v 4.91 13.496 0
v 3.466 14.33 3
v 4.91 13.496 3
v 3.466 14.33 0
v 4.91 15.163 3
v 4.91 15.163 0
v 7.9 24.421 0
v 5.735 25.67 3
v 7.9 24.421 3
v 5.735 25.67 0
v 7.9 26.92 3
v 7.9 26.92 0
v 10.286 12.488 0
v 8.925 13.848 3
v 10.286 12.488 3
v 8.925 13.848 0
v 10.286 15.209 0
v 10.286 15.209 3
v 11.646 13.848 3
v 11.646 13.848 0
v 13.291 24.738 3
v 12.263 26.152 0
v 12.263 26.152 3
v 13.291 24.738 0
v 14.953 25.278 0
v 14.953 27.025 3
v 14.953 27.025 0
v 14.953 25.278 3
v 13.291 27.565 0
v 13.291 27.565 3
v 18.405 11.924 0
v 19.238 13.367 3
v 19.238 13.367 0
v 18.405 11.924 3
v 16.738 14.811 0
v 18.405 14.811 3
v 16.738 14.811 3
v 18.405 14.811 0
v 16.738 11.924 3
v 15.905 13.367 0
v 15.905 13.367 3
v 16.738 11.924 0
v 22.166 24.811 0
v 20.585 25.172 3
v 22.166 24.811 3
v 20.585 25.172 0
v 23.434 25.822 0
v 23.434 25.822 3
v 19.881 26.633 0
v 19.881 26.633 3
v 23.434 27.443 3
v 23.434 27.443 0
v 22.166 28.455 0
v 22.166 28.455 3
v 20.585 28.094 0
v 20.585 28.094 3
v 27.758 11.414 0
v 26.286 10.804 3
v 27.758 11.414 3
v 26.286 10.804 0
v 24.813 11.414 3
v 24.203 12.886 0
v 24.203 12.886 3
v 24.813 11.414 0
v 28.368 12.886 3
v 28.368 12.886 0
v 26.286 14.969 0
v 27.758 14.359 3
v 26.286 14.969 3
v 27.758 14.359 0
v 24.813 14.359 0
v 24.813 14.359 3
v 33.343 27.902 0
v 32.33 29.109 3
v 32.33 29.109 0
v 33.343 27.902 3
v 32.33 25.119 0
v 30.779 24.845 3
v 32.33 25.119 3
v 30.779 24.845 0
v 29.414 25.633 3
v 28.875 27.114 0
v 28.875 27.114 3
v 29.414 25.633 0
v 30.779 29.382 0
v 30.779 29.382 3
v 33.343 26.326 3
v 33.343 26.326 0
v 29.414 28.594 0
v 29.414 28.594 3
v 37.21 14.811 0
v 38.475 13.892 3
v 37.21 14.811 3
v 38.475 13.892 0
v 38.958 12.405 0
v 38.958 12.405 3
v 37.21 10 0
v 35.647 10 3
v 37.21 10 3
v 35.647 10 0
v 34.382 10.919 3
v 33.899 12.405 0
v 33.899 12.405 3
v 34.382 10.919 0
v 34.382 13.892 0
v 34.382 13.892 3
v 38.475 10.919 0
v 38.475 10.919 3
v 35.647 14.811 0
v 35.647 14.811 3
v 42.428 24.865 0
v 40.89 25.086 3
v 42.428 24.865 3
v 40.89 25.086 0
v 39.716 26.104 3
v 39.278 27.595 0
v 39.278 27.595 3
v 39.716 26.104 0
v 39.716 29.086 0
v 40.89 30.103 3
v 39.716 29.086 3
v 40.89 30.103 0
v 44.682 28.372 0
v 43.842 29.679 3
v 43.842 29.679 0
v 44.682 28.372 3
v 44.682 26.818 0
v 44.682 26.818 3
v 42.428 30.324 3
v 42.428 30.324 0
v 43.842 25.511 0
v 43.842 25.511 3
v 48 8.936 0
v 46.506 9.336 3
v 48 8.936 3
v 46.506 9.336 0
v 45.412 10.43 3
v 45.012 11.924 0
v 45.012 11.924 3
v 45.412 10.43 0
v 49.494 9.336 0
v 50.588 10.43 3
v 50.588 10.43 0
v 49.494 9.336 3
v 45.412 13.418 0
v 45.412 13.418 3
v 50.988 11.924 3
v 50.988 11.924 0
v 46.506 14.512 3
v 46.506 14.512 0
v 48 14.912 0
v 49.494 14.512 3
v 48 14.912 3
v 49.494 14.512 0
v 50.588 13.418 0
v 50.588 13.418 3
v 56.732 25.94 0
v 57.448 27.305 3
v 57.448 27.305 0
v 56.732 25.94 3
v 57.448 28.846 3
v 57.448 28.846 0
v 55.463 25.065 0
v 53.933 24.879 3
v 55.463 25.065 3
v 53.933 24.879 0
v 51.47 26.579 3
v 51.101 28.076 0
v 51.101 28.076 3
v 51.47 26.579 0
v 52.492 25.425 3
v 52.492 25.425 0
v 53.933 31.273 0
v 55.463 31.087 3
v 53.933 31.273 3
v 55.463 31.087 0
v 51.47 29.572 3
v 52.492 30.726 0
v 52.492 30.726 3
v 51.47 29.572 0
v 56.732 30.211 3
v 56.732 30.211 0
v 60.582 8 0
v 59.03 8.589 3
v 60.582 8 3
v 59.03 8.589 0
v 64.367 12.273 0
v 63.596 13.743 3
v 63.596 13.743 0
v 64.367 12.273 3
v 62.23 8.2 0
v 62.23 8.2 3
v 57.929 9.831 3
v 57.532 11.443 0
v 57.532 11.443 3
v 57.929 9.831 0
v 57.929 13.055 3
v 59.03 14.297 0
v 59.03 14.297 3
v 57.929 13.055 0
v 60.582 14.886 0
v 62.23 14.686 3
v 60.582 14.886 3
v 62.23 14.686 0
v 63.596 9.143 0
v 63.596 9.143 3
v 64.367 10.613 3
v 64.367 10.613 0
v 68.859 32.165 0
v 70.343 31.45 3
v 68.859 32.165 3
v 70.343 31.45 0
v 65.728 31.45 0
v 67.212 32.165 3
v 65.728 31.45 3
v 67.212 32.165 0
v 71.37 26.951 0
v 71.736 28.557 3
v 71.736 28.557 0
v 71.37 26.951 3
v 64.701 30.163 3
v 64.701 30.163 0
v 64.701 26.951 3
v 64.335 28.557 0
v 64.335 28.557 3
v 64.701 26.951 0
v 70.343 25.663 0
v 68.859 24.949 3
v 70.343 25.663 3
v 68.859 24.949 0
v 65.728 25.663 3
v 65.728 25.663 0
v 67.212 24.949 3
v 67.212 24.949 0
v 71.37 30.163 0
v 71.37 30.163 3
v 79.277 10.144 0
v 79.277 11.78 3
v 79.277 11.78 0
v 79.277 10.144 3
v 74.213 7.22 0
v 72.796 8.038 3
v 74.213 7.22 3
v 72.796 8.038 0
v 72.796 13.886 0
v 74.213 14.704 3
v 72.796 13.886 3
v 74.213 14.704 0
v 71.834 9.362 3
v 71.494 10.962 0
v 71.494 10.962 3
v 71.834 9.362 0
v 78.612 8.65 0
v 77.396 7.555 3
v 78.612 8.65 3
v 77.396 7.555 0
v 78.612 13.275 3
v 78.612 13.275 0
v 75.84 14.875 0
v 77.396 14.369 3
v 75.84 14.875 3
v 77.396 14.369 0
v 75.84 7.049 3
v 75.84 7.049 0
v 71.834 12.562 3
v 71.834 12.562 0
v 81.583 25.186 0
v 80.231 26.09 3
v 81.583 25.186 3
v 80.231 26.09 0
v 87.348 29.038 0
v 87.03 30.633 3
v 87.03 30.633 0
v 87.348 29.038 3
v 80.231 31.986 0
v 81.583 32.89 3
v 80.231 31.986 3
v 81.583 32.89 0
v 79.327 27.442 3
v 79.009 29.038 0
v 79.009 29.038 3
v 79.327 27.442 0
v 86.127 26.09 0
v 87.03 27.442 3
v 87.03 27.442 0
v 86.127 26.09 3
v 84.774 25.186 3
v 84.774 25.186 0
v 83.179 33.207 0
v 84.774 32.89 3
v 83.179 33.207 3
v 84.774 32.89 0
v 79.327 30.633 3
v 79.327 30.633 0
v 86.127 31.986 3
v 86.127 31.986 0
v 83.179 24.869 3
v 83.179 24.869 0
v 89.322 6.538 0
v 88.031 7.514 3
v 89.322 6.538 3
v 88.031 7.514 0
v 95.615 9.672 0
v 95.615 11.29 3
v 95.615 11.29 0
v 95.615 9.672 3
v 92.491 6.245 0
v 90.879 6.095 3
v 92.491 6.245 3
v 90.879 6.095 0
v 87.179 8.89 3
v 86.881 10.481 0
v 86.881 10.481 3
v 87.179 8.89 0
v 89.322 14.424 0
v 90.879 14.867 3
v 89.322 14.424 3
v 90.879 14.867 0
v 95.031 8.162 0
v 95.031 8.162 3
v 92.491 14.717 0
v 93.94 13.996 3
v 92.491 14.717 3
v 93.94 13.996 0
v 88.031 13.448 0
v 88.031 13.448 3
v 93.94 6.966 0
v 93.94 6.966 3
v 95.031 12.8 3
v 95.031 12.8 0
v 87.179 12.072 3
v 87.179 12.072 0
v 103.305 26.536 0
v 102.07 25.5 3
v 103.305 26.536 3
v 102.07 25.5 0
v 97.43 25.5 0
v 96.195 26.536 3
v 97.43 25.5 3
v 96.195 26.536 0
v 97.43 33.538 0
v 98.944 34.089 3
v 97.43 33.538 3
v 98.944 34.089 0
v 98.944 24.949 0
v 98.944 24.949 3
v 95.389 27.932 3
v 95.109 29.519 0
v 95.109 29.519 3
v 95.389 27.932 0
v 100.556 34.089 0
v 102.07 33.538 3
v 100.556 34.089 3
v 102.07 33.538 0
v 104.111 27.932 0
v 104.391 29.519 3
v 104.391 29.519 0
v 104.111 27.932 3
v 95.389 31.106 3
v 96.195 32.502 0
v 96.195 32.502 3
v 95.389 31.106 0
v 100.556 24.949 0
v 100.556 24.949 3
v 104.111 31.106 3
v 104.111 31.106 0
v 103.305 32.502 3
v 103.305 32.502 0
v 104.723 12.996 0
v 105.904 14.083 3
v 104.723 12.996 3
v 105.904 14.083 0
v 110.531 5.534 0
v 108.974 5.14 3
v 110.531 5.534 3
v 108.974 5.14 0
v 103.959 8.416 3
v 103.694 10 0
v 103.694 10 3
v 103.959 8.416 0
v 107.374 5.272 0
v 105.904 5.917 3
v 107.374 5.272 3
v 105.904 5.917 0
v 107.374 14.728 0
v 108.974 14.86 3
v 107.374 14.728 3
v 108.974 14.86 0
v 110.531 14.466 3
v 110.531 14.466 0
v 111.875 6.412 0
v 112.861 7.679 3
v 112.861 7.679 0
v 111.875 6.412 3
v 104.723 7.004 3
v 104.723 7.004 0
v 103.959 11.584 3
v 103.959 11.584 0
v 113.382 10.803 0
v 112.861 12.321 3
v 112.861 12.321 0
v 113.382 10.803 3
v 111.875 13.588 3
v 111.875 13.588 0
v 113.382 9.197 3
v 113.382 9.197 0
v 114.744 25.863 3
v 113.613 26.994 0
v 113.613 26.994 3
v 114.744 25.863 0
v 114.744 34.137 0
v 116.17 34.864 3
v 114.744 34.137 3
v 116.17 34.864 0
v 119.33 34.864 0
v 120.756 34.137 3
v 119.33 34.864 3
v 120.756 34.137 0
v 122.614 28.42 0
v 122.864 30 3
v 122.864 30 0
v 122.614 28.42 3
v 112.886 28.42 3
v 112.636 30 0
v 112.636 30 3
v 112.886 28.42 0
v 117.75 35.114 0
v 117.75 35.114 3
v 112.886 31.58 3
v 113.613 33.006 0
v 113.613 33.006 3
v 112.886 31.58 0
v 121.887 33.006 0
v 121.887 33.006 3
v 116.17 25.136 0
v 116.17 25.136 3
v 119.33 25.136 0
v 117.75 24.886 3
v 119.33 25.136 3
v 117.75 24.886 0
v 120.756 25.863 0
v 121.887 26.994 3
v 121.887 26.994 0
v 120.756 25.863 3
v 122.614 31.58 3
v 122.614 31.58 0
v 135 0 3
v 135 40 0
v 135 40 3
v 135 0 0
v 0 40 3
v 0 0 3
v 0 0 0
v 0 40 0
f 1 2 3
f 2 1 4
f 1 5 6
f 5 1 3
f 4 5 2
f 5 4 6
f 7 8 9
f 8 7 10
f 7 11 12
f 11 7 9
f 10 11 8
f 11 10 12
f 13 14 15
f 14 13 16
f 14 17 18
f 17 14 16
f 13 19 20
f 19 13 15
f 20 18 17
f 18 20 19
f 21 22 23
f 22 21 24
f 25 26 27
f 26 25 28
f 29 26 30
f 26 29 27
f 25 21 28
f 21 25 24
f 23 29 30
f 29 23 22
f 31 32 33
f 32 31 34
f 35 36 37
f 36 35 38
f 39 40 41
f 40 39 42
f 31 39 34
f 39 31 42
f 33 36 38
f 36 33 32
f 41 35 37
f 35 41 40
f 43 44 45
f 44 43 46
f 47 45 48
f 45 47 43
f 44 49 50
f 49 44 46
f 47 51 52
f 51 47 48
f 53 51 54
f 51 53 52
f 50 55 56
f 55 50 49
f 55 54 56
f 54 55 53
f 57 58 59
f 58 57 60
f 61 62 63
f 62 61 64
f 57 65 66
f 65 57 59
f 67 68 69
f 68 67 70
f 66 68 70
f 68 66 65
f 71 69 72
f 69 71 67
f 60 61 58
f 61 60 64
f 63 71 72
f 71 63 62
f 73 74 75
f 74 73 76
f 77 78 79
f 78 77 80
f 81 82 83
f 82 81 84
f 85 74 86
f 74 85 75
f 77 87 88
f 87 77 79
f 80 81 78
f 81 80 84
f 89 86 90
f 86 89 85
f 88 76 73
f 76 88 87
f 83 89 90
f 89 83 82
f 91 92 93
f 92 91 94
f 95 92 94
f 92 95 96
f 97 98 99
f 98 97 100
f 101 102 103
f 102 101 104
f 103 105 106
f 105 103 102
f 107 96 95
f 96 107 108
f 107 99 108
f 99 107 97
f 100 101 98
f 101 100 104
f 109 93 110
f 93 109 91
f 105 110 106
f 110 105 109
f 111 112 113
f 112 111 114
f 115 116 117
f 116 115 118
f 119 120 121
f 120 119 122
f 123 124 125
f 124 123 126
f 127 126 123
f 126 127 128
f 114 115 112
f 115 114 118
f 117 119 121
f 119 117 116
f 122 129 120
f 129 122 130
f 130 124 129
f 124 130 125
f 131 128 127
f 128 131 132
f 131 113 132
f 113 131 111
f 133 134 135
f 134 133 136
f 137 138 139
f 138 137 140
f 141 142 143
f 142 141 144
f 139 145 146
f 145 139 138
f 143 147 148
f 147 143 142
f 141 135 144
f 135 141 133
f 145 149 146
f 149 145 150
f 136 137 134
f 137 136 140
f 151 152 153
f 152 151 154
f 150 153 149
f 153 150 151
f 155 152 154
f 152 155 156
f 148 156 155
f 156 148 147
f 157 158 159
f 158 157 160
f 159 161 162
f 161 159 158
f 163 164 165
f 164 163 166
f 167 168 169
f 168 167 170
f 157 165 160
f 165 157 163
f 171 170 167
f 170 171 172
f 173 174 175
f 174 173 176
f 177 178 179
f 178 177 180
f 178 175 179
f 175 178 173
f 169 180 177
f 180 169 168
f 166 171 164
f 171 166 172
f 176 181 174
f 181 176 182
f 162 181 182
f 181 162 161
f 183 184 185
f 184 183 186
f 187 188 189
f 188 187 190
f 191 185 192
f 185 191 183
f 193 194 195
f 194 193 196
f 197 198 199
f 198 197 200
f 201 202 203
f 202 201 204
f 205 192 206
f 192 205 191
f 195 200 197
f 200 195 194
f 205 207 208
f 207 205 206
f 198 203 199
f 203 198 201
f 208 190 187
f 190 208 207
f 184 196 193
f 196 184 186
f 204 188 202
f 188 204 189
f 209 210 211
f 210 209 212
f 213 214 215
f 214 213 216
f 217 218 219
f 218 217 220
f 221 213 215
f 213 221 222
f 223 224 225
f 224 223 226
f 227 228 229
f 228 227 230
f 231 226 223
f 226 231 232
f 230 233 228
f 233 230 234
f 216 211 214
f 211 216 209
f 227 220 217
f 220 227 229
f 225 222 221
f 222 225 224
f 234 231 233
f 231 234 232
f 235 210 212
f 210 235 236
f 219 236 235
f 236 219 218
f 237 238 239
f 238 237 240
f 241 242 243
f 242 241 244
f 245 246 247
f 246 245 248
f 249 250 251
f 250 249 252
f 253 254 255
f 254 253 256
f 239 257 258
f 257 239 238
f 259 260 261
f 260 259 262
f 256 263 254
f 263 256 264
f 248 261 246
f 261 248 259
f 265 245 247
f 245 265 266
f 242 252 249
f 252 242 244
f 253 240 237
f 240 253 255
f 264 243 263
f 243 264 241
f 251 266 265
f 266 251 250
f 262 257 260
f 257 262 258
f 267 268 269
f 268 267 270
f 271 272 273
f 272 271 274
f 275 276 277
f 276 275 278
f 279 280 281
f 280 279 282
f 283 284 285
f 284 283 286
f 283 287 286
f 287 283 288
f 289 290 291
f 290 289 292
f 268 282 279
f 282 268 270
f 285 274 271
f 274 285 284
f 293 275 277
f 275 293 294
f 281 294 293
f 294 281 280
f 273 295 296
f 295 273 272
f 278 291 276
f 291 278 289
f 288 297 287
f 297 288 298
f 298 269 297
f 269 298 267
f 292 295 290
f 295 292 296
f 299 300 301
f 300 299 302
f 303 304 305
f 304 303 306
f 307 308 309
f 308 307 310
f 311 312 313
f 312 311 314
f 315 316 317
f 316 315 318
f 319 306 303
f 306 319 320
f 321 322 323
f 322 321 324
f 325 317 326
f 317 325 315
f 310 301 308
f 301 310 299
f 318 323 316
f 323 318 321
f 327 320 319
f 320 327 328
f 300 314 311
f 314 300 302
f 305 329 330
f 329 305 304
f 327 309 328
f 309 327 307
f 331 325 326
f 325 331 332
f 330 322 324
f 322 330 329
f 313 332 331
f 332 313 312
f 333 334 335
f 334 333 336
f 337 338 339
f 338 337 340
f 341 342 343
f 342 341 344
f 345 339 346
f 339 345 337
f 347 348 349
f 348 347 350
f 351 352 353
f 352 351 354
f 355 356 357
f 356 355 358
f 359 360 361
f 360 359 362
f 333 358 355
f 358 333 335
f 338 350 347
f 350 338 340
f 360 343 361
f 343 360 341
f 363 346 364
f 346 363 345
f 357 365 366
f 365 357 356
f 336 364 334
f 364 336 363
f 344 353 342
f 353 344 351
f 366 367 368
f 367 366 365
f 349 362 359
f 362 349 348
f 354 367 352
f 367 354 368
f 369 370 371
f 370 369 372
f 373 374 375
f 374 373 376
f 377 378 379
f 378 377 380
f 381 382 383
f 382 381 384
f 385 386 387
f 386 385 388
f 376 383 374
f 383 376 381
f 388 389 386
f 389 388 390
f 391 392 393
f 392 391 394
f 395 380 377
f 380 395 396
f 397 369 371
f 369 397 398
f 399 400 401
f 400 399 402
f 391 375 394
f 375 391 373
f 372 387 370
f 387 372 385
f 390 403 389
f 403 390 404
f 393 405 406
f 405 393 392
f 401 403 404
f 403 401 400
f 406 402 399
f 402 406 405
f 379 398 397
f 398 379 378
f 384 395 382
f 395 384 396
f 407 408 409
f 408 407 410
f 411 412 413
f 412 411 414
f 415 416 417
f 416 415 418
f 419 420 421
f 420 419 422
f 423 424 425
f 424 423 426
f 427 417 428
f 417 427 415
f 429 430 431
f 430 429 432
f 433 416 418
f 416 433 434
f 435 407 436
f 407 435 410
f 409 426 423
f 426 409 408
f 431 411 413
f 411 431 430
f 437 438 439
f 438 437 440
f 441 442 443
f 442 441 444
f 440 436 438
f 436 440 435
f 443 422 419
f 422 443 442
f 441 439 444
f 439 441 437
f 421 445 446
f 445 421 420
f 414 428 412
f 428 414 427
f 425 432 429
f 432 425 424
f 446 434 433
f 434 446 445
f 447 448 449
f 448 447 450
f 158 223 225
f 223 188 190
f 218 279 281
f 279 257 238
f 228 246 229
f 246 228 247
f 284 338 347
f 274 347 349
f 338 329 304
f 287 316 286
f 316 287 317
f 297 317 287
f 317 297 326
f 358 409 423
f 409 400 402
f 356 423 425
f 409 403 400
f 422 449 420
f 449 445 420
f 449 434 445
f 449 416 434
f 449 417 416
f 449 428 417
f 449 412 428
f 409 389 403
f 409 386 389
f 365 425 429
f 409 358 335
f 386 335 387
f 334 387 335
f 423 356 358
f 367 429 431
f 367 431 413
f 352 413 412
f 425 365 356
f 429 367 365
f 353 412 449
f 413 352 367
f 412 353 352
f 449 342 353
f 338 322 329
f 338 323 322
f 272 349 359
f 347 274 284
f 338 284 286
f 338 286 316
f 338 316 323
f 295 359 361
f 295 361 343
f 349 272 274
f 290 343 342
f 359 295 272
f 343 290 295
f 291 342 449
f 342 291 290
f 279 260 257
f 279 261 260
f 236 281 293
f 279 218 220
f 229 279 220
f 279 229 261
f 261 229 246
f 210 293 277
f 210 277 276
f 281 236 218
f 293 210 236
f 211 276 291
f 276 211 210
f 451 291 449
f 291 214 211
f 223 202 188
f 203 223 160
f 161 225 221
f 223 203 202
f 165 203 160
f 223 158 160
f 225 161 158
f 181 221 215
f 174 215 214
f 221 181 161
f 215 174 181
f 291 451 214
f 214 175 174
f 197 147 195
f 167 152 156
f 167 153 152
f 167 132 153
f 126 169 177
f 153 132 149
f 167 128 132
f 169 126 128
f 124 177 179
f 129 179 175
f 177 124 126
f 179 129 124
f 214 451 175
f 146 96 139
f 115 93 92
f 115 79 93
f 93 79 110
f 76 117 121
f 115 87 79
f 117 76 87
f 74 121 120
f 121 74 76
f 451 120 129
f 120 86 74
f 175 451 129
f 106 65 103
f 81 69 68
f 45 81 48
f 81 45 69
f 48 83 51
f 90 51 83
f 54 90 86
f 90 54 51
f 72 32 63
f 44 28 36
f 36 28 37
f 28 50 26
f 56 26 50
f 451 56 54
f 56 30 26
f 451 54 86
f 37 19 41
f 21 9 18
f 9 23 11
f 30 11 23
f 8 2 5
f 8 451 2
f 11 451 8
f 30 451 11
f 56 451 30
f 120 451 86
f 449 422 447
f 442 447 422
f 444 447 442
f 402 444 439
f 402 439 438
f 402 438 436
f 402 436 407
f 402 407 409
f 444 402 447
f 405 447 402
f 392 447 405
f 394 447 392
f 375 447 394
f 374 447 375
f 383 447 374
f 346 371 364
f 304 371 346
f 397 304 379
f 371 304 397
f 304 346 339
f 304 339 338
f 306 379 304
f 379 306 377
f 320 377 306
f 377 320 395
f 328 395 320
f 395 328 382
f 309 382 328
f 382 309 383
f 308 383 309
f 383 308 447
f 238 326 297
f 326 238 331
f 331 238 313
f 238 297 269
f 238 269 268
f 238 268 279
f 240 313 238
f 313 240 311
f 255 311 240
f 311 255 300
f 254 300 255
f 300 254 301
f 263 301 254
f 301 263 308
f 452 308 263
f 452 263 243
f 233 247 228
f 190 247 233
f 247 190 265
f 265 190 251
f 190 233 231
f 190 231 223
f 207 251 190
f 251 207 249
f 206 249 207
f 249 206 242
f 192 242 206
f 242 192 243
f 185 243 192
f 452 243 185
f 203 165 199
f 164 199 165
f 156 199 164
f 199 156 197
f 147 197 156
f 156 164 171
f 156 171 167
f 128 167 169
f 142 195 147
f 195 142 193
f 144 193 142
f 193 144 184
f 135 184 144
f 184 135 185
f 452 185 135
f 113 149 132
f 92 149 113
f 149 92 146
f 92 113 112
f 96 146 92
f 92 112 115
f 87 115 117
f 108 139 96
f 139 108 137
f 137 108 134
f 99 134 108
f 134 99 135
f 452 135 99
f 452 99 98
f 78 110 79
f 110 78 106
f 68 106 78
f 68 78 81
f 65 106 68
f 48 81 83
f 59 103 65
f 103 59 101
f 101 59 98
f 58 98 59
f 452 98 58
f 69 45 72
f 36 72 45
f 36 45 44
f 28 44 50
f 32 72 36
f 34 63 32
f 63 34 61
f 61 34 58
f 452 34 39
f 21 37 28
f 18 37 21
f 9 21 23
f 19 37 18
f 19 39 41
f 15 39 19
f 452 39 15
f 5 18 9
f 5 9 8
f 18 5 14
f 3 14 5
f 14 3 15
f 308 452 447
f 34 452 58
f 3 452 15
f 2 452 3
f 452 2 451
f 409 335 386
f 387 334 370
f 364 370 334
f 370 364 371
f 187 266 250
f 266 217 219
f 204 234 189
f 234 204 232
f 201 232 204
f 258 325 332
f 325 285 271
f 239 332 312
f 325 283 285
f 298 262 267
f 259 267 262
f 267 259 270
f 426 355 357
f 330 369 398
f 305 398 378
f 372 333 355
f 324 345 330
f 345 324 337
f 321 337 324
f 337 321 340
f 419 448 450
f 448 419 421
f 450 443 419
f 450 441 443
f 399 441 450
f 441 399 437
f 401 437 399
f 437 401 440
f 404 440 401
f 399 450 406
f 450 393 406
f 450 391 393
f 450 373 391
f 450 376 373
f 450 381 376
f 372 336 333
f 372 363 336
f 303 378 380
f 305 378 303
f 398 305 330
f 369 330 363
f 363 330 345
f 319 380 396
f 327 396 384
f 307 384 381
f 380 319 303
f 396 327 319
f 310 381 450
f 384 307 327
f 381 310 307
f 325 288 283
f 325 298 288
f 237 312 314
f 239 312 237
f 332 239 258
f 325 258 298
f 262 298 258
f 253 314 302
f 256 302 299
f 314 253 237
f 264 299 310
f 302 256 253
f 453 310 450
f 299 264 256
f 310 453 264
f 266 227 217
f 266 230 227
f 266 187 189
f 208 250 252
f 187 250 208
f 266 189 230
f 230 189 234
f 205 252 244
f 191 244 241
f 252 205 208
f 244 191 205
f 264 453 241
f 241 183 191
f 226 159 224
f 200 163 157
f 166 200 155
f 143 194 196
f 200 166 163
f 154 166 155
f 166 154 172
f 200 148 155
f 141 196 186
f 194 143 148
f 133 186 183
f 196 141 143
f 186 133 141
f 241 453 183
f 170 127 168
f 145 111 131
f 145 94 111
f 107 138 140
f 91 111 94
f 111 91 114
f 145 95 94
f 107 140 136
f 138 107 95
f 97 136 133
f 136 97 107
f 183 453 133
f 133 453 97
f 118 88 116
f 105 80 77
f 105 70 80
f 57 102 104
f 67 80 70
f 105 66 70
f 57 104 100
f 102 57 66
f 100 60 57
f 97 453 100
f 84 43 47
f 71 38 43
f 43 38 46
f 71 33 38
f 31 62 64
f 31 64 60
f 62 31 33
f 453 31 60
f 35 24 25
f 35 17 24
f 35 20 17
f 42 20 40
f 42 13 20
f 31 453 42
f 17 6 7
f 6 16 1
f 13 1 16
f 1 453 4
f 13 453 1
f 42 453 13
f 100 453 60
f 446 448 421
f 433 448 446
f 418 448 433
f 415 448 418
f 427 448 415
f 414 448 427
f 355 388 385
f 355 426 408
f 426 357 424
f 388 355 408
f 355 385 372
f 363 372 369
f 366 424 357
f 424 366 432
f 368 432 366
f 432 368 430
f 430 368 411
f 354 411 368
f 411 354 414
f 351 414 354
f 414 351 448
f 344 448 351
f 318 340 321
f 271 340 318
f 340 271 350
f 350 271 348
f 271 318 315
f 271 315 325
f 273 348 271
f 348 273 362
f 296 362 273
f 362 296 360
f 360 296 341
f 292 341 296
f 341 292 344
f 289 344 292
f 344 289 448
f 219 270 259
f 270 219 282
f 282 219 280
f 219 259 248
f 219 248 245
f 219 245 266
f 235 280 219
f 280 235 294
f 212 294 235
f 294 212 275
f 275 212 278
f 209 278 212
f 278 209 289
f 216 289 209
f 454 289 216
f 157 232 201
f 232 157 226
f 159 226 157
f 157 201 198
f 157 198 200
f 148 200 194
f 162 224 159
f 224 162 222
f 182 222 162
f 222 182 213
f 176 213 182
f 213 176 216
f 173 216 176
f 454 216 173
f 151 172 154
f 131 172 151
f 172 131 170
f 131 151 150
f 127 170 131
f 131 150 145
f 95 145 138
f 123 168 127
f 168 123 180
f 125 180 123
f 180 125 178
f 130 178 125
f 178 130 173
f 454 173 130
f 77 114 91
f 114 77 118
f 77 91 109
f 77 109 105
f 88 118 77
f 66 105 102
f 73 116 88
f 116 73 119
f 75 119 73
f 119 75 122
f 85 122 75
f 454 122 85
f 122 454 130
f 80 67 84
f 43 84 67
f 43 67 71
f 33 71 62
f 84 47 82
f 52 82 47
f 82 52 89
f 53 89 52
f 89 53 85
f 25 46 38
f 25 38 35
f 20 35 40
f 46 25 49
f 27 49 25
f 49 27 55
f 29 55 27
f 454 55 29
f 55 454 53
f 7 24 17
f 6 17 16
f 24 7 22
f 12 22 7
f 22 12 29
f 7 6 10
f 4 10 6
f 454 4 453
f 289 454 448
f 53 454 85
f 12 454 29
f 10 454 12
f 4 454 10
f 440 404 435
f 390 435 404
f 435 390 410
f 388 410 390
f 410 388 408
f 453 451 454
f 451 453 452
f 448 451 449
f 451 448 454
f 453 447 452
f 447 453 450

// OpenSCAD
// polyhole size test from 
// https://hydraraptor.blogspot.com/2011/02/polyholes.html
// in 1/16th inches drf
// offset towards the center so an edge of the holes should be 
// the same distance from the side.

// plate length
width = 40;
// plate width
length=135;
// margin
margin = 10;
// mm vs inch toggle:
scheme = "mm";// [mm,inch]

function inch(x) = x * 25.4 * (scheme=="mm"?16/26.4:1);

module polyhole(h, d) {
    n = max(round(2 * d),3);
    rotate([0,0,180])
        cylinder(h = h, r = (d / 2) / cos (180 / n), $fn = n);
}


difference() {
 cube(size = [length ,width,3]);
    union() {
     for(i = [1:10]) {
            translate([(i * i + i)/1.4 + 3 * i , margin+inch((10-i)/16/2),-1])
                polyhole(h = 5, d = inch(i/16));
                
            let(d = i + 0.5)
                translate([(d * d + d)/1.4 + 3 * d, (width-margin)-(inch((10-i)/32)),-1])
                    polyhole(h = 5, d = inch(d/16));
     }
    }
}
